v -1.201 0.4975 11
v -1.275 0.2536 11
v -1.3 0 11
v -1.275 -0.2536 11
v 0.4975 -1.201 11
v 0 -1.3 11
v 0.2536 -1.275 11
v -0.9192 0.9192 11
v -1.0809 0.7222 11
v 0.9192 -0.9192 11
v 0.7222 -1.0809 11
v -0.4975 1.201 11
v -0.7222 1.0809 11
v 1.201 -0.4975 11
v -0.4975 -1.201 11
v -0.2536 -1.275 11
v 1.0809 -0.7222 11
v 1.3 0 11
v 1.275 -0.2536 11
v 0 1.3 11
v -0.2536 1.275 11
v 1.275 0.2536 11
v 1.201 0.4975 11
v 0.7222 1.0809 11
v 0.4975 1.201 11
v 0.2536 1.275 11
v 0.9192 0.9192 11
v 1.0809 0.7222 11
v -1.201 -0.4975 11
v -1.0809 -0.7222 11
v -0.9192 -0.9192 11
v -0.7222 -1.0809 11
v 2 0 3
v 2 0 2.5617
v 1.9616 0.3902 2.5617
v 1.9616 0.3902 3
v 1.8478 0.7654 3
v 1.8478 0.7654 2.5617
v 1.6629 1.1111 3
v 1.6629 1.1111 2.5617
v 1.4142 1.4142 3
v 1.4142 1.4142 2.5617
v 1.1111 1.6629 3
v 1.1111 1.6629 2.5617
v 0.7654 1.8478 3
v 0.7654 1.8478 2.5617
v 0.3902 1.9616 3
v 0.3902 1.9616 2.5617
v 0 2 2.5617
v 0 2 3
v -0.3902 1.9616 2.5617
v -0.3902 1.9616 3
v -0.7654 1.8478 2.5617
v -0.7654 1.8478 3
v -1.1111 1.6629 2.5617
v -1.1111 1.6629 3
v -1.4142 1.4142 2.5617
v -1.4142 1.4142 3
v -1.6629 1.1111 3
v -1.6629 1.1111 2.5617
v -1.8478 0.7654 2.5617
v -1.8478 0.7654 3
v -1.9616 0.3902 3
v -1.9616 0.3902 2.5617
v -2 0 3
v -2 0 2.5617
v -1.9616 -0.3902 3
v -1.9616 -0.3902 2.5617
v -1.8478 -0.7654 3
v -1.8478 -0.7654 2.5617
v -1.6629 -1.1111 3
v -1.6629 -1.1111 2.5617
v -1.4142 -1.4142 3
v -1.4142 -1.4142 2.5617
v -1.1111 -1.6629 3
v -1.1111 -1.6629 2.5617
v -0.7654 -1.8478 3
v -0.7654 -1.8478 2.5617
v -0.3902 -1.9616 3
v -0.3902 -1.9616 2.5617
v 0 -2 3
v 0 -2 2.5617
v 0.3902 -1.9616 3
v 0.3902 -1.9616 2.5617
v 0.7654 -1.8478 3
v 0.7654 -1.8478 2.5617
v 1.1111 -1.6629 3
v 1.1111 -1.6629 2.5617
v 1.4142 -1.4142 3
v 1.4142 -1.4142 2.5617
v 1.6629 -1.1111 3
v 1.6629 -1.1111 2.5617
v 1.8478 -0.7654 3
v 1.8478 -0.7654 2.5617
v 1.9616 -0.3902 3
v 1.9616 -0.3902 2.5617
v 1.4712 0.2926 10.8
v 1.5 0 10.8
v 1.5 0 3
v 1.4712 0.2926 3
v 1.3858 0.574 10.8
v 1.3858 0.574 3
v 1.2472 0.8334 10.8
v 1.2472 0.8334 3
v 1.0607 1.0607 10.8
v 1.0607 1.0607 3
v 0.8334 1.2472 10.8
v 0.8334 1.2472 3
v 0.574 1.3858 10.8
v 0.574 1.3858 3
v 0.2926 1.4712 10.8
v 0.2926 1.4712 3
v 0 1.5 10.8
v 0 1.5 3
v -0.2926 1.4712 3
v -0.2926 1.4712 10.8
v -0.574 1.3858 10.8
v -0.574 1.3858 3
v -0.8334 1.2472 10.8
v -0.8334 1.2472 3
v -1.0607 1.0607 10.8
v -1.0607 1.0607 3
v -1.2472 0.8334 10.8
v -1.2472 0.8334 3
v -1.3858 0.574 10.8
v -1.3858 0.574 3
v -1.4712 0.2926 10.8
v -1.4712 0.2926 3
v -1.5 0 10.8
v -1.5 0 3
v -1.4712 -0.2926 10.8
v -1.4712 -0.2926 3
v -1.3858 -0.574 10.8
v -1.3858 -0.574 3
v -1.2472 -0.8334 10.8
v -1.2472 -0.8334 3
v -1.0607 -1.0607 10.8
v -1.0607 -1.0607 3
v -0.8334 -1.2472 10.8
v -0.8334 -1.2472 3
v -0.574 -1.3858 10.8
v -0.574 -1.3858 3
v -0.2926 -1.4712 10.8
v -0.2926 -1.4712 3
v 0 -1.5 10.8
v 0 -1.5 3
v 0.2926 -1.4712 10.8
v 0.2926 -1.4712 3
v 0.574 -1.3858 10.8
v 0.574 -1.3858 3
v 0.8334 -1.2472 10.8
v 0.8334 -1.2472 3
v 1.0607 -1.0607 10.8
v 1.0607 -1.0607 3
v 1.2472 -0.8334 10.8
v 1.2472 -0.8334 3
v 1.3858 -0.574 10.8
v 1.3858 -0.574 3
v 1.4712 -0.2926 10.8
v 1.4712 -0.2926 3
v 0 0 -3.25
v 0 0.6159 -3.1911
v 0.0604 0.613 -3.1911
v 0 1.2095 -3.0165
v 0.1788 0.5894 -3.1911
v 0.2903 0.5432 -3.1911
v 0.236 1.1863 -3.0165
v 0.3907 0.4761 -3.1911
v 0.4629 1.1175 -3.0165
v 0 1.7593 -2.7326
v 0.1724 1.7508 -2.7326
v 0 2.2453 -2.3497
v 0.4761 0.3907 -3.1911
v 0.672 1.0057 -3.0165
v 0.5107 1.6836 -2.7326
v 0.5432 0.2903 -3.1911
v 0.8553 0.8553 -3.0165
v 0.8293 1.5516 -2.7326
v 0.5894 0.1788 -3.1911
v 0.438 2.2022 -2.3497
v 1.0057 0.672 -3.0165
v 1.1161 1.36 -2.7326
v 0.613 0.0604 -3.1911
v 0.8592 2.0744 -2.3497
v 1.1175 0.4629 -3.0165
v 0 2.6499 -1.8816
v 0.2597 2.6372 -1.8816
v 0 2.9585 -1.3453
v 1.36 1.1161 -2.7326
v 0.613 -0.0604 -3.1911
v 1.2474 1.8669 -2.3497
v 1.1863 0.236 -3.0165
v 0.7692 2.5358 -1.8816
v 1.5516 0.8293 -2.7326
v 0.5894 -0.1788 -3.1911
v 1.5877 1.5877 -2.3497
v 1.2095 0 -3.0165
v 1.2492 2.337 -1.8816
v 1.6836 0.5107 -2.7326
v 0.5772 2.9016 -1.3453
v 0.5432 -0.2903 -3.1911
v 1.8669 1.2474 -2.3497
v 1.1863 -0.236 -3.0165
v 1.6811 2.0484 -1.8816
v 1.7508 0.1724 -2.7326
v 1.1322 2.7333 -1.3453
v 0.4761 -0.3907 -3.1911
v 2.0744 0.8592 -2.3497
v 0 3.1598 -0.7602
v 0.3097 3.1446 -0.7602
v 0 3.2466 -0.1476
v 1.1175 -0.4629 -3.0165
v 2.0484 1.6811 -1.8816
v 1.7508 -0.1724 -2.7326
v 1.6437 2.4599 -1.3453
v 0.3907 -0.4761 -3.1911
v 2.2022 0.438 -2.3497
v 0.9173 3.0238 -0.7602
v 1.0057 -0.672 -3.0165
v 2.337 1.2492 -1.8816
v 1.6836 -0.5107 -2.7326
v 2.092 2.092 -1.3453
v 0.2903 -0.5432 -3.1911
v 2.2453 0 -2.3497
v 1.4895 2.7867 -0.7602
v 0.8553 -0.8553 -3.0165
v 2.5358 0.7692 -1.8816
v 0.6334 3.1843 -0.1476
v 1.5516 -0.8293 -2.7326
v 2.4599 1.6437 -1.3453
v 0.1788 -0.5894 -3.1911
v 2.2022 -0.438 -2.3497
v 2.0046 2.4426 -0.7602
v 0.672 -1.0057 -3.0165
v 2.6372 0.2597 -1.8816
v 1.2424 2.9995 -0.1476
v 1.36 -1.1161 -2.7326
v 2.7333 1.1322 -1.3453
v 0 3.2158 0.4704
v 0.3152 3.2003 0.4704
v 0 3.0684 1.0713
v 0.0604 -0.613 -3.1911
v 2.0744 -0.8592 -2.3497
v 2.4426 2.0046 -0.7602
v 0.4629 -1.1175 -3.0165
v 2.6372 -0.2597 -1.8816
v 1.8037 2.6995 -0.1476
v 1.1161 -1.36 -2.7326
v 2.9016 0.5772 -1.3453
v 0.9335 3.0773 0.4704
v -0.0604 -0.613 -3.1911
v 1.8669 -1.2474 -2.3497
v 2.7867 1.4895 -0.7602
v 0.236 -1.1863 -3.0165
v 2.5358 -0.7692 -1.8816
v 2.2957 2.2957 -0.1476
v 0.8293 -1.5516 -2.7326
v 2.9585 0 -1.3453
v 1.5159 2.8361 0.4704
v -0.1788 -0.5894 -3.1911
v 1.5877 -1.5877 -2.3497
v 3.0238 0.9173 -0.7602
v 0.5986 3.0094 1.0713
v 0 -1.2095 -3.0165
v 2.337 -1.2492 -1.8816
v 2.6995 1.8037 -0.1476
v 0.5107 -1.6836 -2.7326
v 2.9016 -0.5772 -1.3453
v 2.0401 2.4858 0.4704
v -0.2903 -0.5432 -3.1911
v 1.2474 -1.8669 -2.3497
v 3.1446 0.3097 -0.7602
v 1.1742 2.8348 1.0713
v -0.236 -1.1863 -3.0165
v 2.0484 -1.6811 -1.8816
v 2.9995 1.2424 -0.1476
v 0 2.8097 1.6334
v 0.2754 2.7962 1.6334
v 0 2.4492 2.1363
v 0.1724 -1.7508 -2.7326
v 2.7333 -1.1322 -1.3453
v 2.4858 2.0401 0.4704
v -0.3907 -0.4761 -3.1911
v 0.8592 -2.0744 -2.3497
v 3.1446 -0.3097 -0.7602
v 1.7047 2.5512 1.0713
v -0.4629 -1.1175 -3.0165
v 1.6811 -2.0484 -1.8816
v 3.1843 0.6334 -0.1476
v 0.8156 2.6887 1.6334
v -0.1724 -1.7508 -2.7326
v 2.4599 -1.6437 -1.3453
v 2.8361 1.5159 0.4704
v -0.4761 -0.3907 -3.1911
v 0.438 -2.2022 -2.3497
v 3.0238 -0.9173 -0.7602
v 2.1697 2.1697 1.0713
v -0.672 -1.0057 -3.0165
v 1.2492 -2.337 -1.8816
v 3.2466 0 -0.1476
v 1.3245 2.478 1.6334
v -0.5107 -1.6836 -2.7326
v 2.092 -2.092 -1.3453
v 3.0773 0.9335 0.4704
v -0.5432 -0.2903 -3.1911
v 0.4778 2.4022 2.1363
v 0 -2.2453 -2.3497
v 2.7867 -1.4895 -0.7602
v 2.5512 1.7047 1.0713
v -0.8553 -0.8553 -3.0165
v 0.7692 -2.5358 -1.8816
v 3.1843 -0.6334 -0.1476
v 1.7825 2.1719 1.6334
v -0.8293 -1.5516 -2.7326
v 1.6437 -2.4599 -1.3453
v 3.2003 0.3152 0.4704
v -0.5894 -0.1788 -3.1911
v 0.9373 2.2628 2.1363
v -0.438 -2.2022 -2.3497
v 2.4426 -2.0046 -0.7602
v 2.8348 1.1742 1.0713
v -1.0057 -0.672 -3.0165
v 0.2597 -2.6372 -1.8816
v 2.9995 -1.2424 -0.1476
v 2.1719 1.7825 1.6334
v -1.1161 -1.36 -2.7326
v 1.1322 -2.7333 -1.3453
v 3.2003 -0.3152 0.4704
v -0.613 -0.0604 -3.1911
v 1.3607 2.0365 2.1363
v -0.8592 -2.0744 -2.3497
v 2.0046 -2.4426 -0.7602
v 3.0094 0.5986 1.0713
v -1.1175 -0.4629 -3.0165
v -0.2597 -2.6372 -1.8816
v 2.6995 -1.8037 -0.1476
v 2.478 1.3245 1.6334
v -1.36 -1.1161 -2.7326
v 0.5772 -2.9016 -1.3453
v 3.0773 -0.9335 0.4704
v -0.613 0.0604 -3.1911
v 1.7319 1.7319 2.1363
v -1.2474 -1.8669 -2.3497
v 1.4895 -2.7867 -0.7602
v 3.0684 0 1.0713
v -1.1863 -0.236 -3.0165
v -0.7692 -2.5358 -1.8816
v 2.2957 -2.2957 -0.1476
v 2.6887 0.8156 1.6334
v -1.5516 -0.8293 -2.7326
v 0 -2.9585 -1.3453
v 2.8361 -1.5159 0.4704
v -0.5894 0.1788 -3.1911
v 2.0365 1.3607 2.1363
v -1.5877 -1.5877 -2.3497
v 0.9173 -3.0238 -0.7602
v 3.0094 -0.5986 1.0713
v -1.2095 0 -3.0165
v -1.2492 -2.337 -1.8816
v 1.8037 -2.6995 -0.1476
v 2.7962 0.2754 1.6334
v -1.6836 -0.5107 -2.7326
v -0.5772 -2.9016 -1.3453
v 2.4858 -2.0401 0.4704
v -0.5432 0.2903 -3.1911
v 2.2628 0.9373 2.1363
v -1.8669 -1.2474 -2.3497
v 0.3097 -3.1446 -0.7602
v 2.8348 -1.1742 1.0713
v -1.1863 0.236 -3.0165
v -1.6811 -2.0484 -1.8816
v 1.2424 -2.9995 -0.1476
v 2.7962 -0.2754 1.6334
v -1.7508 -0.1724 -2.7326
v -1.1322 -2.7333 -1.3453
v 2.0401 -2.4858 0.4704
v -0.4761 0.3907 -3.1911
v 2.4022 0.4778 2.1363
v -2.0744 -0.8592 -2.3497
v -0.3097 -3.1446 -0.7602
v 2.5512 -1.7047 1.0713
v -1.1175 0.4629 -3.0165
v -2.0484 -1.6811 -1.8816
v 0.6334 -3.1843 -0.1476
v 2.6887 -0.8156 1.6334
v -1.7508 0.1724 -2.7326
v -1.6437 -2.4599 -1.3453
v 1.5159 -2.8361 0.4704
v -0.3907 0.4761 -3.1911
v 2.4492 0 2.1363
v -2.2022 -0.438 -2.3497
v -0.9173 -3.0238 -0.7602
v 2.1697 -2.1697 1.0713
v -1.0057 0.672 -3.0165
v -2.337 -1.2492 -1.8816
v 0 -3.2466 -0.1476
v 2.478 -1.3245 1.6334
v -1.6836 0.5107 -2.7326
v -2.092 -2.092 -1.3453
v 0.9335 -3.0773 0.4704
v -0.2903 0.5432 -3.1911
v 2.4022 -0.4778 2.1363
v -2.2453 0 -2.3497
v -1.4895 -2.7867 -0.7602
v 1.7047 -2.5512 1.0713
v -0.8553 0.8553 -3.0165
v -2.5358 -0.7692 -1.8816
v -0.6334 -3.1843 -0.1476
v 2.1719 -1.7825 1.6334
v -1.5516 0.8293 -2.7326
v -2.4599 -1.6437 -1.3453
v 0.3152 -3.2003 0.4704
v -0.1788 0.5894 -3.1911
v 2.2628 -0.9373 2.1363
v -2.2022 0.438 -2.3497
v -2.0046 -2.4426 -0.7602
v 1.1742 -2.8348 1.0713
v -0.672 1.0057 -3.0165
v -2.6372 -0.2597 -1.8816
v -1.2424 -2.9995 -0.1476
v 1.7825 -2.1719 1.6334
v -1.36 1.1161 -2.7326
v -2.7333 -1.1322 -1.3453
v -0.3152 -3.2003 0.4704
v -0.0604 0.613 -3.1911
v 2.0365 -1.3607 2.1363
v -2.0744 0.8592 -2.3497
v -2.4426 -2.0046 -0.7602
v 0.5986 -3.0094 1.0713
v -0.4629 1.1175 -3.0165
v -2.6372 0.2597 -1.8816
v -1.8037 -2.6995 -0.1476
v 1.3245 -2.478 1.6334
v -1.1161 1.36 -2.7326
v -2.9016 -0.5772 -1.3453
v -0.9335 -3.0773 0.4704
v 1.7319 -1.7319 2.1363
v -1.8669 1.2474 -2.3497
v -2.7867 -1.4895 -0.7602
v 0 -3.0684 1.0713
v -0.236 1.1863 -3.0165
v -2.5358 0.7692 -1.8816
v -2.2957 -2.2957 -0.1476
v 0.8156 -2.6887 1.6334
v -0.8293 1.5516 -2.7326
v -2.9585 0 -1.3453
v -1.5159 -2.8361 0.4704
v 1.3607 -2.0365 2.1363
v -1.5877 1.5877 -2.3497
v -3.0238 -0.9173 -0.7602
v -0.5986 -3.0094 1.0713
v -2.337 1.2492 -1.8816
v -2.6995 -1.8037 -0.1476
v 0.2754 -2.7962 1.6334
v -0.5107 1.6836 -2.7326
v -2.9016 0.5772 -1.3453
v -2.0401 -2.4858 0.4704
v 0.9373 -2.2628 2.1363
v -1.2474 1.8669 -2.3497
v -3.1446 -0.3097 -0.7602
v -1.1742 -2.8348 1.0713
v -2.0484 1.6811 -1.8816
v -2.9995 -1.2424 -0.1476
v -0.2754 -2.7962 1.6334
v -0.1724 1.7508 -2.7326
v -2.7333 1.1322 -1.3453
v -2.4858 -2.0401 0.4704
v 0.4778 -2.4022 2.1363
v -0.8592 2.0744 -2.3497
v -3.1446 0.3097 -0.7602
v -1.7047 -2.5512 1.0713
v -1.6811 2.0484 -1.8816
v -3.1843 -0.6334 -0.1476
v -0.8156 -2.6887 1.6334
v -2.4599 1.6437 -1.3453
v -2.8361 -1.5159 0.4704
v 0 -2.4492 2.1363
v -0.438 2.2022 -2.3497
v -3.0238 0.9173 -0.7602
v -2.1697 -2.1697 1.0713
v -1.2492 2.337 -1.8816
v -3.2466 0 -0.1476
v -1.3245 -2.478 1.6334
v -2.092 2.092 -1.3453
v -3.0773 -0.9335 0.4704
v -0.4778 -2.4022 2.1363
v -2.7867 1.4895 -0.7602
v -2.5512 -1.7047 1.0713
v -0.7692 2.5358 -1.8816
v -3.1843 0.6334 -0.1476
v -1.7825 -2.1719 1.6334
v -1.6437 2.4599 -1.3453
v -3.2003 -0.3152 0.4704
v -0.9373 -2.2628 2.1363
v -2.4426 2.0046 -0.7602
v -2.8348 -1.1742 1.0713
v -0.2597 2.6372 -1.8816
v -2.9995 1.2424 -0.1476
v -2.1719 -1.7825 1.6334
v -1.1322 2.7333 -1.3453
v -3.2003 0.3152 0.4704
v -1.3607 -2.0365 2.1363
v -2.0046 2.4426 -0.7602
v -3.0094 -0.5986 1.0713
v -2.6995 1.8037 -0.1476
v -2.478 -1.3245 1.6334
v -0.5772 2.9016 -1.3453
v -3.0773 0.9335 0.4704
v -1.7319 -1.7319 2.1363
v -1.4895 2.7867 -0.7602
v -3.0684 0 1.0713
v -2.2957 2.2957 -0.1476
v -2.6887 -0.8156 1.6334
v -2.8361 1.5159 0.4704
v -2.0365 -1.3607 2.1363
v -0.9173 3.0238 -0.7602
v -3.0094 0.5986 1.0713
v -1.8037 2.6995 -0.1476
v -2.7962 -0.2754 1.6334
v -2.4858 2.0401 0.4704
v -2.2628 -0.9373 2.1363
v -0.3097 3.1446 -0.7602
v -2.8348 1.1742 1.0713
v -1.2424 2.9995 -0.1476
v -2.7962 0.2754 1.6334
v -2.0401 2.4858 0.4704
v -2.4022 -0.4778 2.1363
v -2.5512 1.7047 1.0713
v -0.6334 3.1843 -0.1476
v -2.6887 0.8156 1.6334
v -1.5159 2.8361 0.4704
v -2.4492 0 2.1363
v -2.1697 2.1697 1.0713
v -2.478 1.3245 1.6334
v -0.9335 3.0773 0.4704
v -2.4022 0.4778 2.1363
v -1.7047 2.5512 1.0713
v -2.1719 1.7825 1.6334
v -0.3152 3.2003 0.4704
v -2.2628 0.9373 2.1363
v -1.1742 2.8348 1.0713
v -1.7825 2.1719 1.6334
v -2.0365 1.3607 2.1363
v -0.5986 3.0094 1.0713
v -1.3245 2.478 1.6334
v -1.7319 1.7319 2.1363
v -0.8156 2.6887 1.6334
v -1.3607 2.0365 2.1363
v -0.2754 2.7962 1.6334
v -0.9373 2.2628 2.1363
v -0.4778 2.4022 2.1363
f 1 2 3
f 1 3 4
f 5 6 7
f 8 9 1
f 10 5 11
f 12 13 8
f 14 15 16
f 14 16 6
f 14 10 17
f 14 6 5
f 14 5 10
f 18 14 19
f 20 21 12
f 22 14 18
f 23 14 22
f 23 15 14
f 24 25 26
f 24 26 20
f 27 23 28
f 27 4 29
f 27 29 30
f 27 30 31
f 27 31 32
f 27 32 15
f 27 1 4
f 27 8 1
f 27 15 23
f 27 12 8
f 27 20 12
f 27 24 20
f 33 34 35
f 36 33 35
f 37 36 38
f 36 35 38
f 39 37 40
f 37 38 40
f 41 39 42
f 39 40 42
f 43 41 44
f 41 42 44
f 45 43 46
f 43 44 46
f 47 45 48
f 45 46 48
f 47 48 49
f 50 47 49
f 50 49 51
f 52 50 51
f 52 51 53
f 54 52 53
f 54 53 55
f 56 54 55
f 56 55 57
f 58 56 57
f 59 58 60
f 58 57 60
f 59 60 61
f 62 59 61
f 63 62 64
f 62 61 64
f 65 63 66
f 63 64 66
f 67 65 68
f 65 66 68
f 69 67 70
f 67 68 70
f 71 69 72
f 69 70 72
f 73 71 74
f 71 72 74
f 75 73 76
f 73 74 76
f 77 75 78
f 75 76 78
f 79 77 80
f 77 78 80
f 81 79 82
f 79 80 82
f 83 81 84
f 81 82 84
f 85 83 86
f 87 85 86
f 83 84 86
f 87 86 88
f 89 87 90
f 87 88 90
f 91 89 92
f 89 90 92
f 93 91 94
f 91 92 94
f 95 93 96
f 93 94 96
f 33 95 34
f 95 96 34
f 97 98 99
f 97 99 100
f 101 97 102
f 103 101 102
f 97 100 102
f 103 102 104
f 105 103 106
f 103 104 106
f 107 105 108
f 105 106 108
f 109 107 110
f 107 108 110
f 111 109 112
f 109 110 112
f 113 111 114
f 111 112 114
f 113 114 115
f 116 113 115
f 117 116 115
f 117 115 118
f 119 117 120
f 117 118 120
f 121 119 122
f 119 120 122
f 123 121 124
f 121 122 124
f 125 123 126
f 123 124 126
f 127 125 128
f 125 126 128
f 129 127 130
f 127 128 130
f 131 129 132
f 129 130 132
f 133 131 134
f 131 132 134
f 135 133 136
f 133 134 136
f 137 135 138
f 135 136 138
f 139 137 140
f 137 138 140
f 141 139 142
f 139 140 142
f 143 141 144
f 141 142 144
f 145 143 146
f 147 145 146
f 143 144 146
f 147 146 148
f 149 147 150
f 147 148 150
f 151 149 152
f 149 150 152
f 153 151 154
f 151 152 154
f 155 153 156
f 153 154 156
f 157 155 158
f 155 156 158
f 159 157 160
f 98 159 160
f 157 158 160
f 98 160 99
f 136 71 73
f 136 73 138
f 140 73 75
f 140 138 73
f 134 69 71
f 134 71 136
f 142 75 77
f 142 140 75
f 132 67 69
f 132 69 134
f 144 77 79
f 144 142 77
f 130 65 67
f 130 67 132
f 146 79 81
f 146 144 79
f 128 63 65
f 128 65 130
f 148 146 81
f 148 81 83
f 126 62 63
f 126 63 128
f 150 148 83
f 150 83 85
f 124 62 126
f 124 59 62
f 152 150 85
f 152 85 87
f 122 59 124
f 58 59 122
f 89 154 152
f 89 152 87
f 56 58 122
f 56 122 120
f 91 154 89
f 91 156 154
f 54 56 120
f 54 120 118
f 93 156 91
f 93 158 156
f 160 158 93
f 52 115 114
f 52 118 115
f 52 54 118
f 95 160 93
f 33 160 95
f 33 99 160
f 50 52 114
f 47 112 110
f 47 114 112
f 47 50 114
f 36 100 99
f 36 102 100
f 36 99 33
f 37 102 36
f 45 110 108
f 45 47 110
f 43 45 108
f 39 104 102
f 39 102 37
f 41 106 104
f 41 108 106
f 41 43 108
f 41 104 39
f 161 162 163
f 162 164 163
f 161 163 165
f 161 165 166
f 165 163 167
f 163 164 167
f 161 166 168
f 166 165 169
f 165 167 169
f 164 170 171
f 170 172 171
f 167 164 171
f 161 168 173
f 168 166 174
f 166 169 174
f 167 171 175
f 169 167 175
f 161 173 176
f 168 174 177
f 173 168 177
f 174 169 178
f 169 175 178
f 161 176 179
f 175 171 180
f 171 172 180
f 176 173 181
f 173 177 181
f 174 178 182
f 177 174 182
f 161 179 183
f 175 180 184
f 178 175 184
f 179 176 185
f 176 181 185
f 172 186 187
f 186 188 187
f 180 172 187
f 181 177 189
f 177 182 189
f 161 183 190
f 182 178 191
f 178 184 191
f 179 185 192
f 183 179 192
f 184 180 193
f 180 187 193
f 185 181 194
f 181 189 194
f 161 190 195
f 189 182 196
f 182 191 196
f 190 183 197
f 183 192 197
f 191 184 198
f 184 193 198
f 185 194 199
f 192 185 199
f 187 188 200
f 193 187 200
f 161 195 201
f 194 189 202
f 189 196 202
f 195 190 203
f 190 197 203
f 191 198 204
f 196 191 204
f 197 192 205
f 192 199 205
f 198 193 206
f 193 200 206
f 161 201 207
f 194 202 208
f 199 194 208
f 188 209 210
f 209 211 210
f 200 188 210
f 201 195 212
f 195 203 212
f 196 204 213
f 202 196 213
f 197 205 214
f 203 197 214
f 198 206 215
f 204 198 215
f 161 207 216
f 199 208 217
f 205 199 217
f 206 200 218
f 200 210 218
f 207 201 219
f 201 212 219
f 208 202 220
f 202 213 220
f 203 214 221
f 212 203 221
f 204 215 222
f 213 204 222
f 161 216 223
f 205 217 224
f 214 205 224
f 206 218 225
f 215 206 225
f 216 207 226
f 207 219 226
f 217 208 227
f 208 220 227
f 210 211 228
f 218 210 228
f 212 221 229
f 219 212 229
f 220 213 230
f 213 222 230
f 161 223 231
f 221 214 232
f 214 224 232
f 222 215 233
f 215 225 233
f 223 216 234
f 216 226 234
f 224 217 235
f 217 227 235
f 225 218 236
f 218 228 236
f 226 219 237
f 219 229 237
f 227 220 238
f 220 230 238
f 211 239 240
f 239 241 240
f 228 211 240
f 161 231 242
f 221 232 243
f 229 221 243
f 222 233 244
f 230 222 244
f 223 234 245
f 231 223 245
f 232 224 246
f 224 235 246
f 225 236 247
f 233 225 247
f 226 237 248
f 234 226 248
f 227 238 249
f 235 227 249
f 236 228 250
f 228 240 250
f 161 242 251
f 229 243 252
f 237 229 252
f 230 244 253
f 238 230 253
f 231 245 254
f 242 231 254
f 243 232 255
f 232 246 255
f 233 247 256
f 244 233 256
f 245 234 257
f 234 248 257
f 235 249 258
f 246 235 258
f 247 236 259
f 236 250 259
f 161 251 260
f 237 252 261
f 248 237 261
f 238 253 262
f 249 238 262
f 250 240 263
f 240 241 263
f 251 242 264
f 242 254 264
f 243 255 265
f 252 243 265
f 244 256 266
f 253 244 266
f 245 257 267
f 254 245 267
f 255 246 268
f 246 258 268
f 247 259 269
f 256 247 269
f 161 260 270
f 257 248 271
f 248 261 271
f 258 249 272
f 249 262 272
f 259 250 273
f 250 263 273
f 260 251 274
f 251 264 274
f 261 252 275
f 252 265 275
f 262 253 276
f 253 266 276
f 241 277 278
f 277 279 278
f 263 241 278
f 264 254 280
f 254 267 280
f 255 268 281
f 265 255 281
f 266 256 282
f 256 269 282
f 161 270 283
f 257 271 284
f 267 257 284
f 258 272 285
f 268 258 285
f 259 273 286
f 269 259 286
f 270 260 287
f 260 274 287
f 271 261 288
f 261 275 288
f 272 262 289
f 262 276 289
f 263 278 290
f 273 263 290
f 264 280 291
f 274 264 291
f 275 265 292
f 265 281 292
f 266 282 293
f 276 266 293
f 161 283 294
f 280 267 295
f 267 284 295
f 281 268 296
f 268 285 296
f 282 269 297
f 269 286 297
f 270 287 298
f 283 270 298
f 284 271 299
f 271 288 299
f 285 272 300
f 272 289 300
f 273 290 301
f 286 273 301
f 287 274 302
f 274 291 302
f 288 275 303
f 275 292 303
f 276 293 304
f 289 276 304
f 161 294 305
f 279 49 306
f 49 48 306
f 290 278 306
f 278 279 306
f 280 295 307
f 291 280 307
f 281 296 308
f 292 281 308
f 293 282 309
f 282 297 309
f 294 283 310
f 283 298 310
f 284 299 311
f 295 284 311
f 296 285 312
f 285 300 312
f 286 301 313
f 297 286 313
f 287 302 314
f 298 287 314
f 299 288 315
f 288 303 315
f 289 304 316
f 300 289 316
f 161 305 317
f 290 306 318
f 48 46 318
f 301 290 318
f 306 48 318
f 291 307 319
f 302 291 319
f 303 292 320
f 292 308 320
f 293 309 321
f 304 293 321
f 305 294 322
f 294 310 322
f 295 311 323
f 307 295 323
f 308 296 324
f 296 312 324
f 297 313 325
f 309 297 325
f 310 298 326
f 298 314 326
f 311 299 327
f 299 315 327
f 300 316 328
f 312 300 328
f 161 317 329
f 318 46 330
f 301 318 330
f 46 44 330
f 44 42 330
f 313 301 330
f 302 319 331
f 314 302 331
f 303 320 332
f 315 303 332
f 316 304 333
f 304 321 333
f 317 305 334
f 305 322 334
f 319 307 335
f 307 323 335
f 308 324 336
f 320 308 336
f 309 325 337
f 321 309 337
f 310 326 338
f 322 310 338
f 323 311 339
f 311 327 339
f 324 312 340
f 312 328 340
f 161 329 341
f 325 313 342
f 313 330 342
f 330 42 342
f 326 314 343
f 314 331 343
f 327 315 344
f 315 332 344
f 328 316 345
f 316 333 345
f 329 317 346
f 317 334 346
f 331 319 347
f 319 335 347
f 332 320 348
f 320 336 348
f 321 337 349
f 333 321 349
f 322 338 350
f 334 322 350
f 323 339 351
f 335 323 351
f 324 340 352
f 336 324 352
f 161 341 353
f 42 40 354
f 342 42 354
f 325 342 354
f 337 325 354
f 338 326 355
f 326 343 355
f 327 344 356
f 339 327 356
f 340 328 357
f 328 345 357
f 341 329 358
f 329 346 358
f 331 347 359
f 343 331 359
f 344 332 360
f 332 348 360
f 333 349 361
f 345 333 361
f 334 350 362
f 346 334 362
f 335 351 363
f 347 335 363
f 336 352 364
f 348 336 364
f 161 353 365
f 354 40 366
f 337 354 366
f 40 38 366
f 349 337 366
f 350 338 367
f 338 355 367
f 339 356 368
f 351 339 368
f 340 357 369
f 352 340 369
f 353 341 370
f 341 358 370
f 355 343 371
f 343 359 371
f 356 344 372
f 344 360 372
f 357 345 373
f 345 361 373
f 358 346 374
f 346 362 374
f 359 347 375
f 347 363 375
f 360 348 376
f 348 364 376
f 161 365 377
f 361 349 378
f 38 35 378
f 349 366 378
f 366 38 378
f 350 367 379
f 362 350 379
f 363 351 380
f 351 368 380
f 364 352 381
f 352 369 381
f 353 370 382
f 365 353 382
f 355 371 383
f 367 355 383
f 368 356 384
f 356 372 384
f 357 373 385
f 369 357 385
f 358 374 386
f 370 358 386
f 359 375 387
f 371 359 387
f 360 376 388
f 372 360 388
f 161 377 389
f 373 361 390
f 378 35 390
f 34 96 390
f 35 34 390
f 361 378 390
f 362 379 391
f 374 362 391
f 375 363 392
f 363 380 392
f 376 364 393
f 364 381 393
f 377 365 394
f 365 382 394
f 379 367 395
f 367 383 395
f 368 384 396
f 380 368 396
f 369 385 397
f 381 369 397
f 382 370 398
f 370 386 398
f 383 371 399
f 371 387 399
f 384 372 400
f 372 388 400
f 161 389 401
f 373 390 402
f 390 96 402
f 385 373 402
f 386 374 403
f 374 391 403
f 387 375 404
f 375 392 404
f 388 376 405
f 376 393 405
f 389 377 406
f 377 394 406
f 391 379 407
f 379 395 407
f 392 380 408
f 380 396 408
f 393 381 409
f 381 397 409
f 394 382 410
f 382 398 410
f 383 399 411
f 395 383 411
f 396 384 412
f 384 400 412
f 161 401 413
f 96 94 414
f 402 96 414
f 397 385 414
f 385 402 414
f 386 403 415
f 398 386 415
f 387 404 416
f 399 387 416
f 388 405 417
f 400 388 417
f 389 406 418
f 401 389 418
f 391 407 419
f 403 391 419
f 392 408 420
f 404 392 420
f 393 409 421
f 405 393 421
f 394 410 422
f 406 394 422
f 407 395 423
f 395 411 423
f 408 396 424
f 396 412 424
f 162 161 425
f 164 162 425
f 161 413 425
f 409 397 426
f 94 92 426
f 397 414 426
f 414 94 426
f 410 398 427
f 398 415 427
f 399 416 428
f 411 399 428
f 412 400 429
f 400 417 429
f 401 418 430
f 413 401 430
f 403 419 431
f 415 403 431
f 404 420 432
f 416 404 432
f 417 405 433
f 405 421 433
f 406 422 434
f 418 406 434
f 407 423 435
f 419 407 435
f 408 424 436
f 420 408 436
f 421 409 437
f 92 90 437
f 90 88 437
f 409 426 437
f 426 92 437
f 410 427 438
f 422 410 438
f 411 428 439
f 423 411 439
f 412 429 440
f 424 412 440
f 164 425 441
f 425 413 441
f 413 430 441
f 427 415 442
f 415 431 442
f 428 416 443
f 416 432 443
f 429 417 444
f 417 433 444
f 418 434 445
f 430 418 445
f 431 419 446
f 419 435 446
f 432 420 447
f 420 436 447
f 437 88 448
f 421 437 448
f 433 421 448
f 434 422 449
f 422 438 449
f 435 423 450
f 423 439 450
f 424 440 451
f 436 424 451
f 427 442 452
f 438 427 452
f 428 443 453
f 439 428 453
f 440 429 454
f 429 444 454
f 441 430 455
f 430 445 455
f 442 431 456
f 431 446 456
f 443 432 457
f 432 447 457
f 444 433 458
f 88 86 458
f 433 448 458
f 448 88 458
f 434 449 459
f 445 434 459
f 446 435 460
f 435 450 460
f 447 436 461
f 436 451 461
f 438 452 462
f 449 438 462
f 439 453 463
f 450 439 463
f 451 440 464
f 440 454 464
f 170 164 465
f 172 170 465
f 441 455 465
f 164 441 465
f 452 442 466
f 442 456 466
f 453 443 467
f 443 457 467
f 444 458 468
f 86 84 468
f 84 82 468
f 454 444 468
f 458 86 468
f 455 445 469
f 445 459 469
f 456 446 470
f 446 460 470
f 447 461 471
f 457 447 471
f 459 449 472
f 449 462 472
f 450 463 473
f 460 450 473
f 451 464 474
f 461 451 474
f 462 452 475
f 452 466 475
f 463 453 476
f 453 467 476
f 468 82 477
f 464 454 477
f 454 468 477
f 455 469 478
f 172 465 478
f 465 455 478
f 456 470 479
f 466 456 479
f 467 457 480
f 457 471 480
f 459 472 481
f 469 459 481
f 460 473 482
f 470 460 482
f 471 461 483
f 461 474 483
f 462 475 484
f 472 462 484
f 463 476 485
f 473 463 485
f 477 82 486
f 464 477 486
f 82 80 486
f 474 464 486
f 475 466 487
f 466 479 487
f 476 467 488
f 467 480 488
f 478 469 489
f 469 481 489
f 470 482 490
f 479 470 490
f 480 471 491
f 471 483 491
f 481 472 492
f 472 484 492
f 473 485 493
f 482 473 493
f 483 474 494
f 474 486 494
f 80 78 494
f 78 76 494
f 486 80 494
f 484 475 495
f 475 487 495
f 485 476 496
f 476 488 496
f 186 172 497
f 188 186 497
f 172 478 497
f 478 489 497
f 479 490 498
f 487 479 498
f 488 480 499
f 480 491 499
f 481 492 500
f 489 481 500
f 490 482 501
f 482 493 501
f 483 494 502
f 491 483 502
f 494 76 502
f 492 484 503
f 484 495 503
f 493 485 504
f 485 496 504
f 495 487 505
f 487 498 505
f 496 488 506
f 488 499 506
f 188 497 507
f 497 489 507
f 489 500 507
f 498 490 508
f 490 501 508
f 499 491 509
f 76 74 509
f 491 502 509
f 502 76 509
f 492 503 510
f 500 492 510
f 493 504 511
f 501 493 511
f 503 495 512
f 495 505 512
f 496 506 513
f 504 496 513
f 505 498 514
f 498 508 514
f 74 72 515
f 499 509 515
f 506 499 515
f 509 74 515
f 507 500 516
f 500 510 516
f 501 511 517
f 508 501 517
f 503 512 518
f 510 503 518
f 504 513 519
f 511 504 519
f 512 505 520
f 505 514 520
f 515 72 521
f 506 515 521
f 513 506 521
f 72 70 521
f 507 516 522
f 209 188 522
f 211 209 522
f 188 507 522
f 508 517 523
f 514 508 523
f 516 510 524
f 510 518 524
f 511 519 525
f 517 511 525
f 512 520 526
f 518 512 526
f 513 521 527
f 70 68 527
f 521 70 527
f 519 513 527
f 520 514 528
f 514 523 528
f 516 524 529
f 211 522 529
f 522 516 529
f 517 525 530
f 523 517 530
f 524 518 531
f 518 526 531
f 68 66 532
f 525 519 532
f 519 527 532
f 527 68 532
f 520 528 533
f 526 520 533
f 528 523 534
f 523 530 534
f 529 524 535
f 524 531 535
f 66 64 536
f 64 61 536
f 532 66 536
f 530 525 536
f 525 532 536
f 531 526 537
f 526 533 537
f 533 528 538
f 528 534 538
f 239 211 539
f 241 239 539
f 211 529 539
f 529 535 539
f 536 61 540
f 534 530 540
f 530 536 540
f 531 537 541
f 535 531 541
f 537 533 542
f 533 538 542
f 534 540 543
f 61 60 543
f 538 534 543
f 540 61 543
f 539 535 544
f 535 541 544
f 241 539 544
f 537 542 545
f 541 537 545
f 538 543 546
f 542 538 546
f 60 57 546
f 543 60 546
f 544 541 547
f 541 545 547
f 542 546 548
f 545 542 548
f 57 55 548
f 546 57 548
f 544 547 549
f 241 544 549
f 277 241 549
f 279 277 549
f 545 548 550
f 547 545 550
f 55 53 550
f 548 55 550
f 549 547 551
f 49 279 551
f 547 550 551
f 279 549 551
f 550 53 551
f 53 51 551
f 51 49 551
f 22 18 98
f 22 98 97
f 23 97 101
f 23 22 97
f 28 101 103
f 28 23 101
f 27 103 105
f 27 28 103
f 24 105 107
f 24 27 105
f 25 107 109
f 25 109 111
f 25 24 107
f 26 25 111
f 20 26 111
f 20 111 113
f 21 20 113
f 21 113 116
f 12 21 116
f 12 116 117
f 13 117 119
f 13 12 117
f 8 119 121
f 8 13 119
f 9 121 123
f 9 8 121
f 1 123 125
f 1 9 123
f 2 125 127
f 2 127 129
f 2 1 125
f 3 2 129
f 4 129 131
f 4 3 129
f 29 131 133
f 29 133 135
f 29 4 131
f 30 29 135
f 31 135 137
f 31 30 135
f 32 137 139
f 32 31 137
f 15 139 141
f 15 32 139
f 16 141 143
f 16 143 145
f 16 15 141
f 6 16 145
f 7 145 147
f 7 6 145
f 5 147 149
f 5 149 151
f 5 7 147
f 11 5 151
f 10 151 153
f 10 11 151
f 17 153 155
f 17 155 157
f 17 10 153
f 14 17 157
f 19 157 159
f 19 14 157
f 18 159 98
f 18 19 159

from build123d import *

# Parameters (mm, degrees)
F2_R     = 2
F3_DEPTH = 3
F4_R     = 1.5
F5_DEPTH = 8
F6_SIZE  = 0.2


with BuildPart() as f1:
    # F0 (on Right) → F1 (revolve)
    with BuildSketch(Plane.YZ):
        with BuildLine():
            Line((0, 3.25), (0, -3.25))
            ThreePointArc((0, -3.25), (3.25, 0), (0, 3.25))
        make_face()
    revolve(axis=Axis((0, 0, 0), (0, 0, -1)))

    # F2 (on Top) → F3 (join)
    with BuildSketch(Plane.XY):
        Circle(F2_R)
    extrude(amount=F3_DEPTH)

    # F4 (on face) → F5 (join)
    with BuildSketch(Plane.XY.offset(3)):
        Circle(F4_R)
    extrude(amount=F5_DEPTH)

    # F6
    f6_edges = [f1.edges().sort_by_distance(p)[0] for p in [
        (-1.5, 0, 11),
    ]]
    chamfer(f6_edges, length=F6_SIZE)


solid = f1.part
